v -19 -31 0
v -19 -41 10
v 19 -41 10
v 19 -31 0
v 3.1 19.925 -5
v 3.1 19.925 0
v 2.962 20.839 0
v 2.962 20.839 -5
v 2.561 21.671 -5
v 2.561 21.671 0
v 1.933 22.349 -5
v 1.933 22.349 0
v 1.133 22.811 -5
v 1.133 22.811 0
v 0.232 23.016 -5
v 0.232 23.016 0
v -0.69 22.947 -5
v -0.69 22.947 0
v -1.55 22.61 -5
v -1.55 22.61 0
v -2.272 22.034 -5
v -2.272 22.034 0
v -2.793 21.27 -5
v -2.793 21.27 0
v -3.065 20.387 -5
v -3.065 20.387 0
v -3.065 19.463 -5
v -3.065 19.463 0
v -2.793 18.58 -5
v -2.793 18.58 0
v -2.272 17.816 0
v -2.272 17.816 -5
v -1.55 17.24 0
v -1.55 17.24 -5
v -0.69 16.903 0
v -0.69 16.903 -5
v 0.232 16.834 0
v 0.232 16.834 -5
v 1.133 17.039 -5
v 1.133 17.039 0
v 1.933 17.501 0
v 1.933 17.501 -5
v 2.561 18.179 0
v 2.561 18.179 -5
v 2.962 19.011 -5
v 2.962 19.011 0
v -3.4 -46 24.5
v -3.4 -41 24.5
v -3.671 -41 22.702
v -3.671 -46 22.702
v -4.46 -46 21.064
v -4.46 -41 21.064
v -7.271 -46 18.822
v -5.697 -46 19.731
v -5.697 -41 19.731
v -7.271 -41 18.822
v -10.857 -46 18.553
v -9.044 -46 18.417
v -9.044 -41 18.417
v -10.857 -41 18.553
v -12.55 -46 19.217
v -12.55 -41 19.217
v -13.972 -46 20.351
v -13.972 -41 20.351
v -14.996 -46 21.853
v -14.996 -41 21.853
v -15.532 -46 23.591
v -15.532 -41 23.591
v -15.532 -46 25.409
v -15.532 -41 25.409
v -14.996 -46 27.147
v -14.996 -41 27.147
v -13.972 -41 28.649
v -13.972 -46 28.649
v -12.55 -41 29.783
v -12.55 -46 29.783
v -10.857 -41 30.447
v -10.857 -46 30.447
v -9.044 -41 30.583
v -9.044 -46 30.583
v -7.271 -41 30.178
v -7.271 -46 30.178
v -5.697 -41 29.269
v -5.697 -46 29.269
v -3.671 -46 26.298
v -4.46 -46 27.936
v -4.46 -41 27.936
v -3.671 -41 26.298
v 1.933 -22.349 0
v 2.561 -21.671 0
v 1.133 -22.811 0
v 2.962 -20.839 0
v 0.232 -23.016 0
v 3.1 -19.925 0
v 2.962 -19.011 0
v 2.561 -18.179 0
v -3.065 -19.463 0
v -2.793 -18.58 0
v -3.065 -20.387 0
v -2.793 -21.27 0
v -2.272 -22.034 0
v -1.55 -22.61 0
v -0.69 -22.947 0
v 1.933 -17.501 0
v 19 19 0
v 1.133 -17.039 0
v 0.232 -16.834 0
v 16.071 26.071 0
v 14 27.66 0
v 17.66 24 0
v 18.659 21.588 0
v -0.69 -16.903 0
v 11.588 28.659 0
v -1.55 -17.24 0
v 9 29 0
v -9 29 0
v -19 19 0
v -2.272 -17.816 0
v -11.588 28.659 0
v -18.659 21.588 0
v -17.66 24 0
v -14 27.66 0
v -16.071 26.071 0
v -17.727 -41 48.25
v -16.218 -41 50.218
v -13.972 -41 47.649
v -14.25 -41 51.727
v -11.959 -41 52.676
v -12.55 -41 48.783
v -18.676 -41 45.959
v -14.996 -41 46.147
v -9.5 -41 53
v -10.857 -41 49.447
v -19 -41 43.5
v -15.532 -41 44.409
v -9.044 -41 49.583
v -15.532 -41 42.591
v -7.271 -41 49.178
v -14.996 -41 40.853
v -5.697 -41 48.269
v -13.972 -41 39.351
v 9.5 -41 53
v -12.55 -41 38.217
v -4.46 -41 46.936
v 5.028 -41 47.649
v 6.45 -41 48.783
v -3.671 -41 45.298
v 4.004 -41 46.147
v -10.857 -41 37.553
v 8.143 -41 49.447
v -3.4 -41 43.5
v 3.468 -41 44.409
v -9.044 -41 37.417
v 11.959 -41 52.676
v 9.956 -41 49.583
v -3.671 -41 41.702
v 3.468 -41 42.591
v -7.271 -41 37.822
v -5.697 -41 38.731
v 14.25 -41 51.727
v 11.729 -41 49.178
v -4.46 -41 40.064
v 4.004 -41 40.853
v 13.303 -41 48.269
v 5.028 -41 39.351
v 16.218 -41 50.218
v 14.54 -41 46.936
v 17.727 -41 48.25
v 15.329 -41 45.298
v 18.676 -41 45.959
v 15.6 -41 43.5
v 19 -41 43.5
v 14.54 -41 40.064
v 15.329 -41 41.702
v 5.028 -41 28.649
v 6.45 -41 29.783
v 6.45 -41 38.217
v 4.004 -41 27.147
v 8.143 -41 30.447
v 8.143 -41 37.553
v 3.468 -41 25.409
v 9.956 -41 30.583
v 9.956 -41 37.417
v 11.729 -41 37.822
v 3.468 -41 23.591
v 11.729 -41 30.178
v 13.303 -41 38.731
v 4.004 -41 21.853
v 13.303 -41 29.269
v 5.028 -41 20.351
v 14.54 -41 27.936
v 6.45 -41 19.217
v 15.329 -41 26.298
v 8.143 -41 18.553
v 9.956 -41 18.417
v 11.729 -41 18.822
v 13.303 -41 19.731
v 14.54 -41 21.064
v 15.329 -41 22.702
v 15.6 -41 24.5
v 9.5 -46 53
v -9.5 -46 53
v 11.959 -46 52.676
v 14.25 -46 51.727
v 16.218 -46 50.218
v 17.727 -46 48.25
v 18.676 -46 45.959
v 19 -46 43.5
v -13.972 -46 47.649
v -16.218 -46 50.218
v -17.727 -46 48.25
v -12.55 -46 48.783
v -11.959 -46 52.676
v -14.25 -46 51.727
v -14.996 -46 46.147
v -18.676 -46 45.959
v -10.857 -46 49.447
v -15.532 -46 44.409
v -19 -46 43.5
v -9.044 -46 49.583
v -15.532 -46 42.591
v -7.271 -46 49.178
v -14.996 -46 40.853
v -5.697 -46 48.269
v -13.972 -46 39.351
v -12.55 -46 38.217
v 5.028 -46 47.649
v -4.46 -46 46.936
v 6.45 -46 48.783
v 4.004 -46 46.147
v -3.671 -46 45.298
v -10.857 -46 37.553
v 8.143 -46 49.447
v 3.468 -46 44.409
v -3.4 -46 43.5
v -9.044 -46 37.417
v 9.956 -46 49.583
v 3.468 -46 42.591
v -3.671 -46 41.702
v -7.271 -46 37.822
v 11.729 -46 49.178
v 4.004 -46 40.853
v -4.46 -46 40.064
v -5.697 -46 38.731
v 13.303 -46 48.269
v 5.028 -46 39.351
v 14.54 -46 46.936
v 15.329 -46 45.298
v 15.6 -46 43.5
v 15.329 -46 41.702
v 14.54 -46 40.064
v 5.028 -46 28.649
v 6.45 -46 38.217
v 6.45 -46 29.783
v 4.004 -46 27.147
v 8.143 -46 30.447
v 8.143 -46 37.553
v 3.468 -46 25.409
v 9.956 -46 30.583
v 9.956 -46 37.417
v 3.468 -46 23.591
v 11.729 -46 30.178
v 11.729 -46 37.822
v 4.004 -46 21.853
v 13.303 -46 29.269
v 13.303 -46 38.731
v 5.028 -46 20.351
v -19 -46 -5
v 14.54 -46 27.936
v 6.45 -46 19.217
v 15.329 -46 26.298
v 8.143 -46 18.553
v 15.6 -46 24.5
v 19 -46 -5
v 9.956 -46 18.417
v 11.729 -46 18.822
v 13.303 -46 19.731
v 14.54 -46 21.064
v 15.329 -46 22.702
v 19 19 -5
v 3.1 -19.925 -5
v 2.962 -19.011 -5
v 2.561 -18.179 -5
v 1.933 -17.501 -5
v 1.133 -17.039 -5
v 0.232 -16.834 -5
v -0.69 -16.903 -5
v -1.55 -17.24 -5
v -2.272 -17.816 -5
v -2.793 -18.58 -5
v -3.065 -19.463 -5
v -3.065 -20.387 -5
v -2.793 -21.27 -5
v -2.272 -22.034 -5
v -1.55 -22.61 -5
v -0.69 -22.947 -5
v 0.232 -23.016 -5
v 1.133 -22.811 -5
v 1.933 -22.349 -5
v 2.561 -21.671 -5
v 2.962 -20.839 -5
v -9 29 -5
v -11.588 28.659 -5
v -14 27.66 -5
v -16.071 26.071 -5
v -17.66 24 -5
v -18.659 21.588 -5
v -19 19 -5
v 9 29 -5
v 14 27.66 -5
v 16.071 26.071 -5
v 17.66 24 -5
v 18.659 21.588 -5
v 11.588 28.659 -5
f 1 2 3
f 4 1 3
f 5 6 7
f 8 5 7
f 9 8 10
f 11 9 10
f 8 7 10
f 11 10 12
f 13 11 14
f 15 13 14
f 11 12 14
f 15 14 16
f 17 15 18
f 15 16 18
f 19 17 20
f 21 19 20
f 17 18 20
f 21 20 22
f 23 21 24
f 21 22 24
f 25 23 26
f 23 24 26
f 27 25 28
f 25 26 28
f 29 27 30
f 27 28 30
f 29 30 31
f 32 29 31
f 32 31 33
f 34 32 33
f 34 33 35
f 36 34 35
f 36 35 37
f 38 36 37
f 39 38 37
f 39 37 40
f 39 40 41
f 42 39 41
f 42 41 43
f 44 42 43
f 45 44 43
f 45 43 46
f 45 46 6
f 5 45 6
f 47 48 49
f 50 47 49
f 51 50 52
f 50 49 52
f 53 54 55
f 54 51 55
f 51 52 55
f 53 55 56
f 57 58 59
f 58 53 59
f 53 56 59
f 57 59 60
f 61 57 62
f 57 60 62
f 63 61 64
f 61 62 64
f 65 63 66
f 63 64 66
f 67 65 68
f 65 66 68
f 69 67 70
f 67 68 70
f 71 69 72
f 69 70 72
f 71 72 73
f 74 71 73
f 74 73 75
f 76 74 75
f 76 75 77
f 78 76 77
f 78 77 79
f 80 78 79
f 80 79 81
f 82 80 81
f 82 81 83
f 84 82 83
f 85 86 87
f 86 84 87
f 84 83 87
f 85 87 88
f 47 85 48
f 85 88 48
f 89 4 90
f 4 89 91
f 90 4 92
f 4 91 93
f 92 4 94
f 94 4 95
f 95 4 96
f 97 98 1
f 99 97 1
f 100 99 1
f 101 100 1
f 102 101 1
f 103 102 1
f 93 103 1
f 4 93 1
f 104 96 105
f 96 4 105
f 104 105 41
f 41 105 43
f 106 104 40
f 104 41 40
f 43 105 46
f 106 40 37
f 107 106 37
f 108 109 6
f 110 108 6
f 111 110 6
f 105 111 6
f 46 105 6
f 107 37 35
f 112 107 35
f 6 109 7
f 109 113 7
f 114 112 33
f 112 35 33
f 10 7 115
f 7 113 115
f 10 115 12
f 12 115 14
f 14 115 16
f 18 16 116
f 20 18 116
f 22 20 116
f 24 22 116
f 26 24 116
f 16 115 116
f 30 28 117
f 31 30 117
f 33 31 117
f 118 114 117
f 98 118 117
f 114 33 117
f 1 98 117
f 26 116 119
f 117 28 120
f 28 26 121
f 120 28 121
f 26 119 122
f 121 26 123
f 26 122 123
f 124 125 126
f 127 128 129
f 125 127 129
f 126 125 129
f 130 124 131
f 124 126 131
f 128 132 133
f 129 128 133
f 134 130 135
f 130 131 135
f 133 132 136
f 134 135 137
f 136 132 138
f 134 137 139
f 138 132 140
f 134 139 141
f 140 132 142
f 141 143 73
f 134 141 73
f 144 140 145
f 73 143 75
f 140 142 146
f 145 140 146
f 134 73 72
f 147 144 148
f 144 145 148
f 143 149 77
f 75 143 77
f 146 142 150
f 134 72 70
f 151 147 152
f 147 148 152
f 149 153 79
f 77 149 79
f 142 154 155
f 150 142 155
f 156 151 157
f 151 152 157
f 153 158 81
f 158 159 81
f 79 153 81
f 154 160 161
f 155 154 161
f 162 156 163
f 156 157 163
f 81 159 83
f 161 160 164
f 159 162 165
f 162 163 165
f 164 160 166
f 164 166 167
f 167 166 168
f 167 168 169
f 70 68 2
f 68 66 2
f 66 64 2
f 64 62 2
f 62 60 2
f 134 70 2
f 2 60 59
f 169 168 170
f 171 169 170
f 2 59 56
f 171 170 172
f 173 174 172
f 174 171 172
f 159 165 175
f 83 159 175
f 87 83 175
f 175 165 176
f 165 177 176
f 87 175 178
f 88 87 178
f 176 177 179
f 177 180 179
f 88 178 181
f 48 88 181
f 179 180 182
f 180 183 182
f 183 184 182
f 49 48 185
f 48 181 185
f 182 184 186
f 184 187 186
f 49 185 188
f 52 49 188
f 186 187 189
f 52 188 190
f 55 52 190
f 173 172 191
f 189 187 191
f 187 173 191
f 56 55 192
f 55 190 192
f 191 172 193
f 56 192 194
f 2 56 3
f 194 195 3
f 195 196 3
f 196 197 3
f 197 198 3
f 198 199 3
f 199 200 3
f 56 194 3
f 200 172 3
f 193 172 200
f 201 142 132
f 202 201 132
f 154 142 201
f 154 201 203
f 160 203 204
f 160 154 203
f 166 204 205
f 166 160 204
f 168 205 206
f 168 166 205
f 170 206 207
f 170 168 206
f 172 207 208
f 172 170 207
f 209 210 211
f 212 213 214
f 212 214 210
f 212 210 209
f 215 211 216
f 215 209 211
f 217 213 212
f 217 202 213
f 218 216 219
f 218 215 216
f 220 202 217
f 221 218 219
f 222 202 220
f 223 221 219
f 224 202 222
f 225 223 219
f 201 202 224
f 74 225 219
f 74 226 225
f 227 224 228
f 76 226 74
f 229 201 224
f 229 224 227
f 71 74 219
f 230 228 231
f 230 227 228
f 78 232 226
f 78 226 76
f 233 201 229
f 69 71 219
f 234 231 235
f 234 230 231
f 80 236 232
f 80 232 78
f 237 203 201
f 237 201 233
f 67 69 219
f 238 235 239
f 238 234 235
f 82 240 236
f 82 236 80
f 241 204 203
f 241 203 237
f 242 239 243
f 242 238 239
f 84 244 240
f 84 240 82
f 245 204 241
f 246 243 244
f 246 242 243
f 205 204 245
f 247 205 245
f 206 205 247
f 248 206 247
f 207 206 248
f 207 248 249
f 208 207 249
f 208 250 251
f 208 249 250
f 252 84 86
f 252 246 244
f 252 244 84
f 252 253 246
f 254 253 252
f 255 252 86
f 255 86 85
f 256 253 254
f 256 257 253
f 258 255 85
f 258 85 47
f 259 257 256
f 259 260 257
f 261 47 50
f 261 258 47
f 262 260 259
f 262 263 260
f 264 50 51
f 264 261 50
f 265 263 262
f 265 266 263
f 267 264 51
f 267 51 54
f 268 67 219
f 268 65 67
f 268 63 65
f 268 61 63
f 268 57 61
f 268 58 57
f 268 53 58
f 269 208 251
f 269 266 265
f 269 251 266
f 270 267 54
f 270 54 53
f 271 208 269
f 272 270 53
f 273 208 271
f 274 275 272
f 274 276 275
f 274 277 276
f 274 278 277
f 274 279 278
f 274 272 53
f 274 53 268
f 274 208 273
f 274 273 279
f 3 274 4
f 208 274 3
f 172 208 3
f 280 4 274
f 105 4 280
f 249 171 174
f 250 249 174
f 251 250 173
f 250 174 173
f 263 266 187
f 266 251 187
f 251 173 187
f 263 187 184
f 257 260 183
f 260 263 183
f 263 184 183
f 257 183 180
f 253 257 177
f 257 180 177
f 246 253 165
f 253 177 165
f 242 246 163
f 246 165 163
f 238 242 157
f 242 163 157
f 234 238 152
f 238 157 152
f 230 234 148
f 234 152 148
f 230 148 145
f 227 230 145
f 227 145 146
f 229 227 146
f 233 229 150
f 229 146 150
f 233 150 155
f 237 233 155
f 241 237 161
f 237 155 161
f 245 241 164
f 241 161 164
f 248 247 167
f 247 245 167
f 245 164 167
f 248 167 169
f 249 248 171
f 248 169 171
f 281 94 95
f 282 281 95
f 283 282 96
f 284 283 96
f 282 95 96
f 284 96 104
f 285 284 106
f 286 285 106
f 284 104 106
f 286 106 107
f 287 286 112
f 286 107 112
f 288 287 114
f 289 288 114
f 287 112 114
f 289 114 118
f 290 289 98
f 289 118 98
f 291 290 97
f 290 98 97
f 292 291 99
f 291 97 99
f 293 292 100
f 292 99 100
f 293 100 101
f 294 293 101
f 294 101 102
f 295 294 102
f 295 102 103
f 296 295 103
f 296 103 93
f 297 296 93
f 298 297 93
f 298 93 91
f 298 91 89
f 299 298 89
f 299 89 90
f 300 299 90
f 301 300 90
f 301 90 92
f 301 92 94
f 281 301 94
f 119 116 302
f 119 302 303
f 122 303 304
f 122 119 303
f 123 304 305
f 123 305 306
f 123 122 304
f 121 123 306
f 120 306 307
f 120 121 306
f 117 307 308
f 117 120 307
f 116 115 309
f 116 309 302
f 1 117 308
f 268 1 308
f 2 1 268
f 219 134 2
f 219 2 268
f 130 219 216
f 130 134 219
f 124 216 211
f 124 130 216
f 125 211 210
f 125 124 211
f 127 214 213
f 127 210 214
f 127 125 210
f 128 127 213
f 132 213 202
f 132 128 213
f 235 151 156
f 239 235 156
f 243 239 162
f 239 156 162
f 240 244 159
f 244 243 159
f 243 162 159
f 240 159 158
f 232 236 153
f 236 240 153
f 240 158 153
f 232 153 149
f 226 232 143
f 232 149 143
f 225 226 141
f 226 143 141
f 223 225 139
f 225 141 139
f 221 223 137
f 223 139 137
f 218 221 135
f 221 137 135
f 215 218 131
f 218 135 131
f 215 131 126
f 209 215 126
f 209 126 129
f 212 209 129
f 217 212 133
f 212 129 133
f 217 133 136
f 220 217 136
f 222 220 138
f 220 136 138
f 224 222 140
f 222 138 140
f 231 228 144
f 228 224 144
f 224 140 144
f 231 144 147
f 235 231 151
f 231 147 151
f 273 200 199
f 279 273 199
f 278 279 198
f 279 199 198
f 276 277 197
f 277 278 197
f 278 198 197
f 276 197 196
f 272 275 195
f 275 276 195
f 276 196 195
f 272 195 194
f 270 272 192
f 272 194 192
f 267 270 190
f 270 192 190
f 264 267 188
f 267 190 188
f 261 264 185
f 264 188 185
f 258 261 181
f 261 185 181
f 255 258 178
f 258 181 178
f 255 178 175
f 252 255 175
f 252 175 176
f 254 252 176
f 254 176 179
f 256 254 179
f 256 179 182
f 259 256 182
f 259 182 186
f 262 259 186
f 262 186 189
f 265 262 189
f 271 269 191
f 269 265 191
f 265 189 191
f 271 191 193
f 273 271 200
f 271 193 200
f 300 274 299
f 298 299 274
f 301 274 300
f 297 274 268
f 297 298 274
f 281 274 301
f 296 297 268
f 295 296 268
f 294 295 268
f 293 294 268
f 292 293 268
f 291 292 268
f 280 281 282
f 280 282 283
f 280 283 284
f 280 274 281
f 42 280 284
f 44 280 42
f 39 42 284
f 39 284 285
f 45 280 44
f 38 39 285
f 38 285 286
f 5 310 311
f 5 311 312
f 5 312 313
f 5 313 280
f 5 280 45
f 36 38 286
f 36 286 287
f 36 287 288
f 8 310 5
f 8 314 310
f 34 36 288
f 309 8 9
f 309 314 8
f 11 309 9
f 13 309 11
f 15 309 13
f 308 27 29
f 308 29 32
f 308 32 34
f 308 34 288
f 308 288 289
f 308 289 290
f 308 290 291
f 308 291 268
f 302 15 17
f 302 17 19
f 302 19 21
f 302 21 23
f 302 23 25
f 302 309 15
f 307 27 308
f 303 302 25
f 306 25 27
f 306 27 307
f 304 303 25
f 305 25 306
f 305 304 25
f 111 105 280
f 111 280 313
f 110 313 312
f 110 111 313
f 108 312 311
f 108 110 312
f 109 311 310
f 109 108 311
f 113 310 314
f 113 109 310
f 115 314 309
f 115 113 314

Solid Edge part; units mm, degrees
sketch "Sketch1" plane through (0, 0, 0) normal (0, 0, 1) x (1, 0, 0)
  circle A0 centre (0, -19.925) radius 3.1
  circle A1 centre (0, 19.925) radius 3.1
  arc A2 (9, 29) -> (19, 19) centre (9, 19) cw
  line L0 (19, -29) -> (19, 19)
  line L1 (19, -41) -> (19, -29)
  line L2 (-19, -41) -> (19, -41)
  line L3 (-5.5, -41) -> (5.5, -41) construction
  line L4 (-19, -29) -> (-19, -41)
  line L5 (-19, 19) -> (-19, -29)
  arc A3 (-9, 29) -> (-19, 19) centre (-9, 19) ccw
  line L6 (9, 29) -> (-9, 29)
  dimension "D1" = 48
  dimension "D2" = 70
  dimension "D3" = 18
  dimension "D4" = 11
extrude "Protrusion1" add sketch "Sketch1" against normal blind 5
sketch "Sketch2" plane through (0, -41, -2.5) normal (0, -1, 0) x (1, 0, 0)
  line L0 (-19, -2.5) -> (19, -2.5)
  line L1 (19, -2.5) -> (19, 17.5)
  line L2 (19, 17.5) -> (19, 46)
  arc A0 (9.5, 55.5) -> (19, 46) centre (9.5, 46) cw
  line L3 (9.5, 55.5) -> (-9.5, 55.5)
  arc A1 (-9.5, 55.5) -> (-19, 46) centre (-9.5, 46) ccw
  line L4 (-19, 46) -> (-19, 17.5)
  line L5 (-19, 17.5) -> (-19, -2.5)
  circle A2 centre (-9.5, 27) radius 6.1
  circle A3 centre (9.5, 27) radius 6.1
  circle A4 centre (9.5, 46) radius 6.1
  circle A5 centre (-9.5, 46) radius 6.1
extrude "Extrusionsausprägung_2" add sketch "Sketch2" along normal blind 5
chamfer "Fase_1" distance 10 angle 45 1 edges at (0, -41, 0)
